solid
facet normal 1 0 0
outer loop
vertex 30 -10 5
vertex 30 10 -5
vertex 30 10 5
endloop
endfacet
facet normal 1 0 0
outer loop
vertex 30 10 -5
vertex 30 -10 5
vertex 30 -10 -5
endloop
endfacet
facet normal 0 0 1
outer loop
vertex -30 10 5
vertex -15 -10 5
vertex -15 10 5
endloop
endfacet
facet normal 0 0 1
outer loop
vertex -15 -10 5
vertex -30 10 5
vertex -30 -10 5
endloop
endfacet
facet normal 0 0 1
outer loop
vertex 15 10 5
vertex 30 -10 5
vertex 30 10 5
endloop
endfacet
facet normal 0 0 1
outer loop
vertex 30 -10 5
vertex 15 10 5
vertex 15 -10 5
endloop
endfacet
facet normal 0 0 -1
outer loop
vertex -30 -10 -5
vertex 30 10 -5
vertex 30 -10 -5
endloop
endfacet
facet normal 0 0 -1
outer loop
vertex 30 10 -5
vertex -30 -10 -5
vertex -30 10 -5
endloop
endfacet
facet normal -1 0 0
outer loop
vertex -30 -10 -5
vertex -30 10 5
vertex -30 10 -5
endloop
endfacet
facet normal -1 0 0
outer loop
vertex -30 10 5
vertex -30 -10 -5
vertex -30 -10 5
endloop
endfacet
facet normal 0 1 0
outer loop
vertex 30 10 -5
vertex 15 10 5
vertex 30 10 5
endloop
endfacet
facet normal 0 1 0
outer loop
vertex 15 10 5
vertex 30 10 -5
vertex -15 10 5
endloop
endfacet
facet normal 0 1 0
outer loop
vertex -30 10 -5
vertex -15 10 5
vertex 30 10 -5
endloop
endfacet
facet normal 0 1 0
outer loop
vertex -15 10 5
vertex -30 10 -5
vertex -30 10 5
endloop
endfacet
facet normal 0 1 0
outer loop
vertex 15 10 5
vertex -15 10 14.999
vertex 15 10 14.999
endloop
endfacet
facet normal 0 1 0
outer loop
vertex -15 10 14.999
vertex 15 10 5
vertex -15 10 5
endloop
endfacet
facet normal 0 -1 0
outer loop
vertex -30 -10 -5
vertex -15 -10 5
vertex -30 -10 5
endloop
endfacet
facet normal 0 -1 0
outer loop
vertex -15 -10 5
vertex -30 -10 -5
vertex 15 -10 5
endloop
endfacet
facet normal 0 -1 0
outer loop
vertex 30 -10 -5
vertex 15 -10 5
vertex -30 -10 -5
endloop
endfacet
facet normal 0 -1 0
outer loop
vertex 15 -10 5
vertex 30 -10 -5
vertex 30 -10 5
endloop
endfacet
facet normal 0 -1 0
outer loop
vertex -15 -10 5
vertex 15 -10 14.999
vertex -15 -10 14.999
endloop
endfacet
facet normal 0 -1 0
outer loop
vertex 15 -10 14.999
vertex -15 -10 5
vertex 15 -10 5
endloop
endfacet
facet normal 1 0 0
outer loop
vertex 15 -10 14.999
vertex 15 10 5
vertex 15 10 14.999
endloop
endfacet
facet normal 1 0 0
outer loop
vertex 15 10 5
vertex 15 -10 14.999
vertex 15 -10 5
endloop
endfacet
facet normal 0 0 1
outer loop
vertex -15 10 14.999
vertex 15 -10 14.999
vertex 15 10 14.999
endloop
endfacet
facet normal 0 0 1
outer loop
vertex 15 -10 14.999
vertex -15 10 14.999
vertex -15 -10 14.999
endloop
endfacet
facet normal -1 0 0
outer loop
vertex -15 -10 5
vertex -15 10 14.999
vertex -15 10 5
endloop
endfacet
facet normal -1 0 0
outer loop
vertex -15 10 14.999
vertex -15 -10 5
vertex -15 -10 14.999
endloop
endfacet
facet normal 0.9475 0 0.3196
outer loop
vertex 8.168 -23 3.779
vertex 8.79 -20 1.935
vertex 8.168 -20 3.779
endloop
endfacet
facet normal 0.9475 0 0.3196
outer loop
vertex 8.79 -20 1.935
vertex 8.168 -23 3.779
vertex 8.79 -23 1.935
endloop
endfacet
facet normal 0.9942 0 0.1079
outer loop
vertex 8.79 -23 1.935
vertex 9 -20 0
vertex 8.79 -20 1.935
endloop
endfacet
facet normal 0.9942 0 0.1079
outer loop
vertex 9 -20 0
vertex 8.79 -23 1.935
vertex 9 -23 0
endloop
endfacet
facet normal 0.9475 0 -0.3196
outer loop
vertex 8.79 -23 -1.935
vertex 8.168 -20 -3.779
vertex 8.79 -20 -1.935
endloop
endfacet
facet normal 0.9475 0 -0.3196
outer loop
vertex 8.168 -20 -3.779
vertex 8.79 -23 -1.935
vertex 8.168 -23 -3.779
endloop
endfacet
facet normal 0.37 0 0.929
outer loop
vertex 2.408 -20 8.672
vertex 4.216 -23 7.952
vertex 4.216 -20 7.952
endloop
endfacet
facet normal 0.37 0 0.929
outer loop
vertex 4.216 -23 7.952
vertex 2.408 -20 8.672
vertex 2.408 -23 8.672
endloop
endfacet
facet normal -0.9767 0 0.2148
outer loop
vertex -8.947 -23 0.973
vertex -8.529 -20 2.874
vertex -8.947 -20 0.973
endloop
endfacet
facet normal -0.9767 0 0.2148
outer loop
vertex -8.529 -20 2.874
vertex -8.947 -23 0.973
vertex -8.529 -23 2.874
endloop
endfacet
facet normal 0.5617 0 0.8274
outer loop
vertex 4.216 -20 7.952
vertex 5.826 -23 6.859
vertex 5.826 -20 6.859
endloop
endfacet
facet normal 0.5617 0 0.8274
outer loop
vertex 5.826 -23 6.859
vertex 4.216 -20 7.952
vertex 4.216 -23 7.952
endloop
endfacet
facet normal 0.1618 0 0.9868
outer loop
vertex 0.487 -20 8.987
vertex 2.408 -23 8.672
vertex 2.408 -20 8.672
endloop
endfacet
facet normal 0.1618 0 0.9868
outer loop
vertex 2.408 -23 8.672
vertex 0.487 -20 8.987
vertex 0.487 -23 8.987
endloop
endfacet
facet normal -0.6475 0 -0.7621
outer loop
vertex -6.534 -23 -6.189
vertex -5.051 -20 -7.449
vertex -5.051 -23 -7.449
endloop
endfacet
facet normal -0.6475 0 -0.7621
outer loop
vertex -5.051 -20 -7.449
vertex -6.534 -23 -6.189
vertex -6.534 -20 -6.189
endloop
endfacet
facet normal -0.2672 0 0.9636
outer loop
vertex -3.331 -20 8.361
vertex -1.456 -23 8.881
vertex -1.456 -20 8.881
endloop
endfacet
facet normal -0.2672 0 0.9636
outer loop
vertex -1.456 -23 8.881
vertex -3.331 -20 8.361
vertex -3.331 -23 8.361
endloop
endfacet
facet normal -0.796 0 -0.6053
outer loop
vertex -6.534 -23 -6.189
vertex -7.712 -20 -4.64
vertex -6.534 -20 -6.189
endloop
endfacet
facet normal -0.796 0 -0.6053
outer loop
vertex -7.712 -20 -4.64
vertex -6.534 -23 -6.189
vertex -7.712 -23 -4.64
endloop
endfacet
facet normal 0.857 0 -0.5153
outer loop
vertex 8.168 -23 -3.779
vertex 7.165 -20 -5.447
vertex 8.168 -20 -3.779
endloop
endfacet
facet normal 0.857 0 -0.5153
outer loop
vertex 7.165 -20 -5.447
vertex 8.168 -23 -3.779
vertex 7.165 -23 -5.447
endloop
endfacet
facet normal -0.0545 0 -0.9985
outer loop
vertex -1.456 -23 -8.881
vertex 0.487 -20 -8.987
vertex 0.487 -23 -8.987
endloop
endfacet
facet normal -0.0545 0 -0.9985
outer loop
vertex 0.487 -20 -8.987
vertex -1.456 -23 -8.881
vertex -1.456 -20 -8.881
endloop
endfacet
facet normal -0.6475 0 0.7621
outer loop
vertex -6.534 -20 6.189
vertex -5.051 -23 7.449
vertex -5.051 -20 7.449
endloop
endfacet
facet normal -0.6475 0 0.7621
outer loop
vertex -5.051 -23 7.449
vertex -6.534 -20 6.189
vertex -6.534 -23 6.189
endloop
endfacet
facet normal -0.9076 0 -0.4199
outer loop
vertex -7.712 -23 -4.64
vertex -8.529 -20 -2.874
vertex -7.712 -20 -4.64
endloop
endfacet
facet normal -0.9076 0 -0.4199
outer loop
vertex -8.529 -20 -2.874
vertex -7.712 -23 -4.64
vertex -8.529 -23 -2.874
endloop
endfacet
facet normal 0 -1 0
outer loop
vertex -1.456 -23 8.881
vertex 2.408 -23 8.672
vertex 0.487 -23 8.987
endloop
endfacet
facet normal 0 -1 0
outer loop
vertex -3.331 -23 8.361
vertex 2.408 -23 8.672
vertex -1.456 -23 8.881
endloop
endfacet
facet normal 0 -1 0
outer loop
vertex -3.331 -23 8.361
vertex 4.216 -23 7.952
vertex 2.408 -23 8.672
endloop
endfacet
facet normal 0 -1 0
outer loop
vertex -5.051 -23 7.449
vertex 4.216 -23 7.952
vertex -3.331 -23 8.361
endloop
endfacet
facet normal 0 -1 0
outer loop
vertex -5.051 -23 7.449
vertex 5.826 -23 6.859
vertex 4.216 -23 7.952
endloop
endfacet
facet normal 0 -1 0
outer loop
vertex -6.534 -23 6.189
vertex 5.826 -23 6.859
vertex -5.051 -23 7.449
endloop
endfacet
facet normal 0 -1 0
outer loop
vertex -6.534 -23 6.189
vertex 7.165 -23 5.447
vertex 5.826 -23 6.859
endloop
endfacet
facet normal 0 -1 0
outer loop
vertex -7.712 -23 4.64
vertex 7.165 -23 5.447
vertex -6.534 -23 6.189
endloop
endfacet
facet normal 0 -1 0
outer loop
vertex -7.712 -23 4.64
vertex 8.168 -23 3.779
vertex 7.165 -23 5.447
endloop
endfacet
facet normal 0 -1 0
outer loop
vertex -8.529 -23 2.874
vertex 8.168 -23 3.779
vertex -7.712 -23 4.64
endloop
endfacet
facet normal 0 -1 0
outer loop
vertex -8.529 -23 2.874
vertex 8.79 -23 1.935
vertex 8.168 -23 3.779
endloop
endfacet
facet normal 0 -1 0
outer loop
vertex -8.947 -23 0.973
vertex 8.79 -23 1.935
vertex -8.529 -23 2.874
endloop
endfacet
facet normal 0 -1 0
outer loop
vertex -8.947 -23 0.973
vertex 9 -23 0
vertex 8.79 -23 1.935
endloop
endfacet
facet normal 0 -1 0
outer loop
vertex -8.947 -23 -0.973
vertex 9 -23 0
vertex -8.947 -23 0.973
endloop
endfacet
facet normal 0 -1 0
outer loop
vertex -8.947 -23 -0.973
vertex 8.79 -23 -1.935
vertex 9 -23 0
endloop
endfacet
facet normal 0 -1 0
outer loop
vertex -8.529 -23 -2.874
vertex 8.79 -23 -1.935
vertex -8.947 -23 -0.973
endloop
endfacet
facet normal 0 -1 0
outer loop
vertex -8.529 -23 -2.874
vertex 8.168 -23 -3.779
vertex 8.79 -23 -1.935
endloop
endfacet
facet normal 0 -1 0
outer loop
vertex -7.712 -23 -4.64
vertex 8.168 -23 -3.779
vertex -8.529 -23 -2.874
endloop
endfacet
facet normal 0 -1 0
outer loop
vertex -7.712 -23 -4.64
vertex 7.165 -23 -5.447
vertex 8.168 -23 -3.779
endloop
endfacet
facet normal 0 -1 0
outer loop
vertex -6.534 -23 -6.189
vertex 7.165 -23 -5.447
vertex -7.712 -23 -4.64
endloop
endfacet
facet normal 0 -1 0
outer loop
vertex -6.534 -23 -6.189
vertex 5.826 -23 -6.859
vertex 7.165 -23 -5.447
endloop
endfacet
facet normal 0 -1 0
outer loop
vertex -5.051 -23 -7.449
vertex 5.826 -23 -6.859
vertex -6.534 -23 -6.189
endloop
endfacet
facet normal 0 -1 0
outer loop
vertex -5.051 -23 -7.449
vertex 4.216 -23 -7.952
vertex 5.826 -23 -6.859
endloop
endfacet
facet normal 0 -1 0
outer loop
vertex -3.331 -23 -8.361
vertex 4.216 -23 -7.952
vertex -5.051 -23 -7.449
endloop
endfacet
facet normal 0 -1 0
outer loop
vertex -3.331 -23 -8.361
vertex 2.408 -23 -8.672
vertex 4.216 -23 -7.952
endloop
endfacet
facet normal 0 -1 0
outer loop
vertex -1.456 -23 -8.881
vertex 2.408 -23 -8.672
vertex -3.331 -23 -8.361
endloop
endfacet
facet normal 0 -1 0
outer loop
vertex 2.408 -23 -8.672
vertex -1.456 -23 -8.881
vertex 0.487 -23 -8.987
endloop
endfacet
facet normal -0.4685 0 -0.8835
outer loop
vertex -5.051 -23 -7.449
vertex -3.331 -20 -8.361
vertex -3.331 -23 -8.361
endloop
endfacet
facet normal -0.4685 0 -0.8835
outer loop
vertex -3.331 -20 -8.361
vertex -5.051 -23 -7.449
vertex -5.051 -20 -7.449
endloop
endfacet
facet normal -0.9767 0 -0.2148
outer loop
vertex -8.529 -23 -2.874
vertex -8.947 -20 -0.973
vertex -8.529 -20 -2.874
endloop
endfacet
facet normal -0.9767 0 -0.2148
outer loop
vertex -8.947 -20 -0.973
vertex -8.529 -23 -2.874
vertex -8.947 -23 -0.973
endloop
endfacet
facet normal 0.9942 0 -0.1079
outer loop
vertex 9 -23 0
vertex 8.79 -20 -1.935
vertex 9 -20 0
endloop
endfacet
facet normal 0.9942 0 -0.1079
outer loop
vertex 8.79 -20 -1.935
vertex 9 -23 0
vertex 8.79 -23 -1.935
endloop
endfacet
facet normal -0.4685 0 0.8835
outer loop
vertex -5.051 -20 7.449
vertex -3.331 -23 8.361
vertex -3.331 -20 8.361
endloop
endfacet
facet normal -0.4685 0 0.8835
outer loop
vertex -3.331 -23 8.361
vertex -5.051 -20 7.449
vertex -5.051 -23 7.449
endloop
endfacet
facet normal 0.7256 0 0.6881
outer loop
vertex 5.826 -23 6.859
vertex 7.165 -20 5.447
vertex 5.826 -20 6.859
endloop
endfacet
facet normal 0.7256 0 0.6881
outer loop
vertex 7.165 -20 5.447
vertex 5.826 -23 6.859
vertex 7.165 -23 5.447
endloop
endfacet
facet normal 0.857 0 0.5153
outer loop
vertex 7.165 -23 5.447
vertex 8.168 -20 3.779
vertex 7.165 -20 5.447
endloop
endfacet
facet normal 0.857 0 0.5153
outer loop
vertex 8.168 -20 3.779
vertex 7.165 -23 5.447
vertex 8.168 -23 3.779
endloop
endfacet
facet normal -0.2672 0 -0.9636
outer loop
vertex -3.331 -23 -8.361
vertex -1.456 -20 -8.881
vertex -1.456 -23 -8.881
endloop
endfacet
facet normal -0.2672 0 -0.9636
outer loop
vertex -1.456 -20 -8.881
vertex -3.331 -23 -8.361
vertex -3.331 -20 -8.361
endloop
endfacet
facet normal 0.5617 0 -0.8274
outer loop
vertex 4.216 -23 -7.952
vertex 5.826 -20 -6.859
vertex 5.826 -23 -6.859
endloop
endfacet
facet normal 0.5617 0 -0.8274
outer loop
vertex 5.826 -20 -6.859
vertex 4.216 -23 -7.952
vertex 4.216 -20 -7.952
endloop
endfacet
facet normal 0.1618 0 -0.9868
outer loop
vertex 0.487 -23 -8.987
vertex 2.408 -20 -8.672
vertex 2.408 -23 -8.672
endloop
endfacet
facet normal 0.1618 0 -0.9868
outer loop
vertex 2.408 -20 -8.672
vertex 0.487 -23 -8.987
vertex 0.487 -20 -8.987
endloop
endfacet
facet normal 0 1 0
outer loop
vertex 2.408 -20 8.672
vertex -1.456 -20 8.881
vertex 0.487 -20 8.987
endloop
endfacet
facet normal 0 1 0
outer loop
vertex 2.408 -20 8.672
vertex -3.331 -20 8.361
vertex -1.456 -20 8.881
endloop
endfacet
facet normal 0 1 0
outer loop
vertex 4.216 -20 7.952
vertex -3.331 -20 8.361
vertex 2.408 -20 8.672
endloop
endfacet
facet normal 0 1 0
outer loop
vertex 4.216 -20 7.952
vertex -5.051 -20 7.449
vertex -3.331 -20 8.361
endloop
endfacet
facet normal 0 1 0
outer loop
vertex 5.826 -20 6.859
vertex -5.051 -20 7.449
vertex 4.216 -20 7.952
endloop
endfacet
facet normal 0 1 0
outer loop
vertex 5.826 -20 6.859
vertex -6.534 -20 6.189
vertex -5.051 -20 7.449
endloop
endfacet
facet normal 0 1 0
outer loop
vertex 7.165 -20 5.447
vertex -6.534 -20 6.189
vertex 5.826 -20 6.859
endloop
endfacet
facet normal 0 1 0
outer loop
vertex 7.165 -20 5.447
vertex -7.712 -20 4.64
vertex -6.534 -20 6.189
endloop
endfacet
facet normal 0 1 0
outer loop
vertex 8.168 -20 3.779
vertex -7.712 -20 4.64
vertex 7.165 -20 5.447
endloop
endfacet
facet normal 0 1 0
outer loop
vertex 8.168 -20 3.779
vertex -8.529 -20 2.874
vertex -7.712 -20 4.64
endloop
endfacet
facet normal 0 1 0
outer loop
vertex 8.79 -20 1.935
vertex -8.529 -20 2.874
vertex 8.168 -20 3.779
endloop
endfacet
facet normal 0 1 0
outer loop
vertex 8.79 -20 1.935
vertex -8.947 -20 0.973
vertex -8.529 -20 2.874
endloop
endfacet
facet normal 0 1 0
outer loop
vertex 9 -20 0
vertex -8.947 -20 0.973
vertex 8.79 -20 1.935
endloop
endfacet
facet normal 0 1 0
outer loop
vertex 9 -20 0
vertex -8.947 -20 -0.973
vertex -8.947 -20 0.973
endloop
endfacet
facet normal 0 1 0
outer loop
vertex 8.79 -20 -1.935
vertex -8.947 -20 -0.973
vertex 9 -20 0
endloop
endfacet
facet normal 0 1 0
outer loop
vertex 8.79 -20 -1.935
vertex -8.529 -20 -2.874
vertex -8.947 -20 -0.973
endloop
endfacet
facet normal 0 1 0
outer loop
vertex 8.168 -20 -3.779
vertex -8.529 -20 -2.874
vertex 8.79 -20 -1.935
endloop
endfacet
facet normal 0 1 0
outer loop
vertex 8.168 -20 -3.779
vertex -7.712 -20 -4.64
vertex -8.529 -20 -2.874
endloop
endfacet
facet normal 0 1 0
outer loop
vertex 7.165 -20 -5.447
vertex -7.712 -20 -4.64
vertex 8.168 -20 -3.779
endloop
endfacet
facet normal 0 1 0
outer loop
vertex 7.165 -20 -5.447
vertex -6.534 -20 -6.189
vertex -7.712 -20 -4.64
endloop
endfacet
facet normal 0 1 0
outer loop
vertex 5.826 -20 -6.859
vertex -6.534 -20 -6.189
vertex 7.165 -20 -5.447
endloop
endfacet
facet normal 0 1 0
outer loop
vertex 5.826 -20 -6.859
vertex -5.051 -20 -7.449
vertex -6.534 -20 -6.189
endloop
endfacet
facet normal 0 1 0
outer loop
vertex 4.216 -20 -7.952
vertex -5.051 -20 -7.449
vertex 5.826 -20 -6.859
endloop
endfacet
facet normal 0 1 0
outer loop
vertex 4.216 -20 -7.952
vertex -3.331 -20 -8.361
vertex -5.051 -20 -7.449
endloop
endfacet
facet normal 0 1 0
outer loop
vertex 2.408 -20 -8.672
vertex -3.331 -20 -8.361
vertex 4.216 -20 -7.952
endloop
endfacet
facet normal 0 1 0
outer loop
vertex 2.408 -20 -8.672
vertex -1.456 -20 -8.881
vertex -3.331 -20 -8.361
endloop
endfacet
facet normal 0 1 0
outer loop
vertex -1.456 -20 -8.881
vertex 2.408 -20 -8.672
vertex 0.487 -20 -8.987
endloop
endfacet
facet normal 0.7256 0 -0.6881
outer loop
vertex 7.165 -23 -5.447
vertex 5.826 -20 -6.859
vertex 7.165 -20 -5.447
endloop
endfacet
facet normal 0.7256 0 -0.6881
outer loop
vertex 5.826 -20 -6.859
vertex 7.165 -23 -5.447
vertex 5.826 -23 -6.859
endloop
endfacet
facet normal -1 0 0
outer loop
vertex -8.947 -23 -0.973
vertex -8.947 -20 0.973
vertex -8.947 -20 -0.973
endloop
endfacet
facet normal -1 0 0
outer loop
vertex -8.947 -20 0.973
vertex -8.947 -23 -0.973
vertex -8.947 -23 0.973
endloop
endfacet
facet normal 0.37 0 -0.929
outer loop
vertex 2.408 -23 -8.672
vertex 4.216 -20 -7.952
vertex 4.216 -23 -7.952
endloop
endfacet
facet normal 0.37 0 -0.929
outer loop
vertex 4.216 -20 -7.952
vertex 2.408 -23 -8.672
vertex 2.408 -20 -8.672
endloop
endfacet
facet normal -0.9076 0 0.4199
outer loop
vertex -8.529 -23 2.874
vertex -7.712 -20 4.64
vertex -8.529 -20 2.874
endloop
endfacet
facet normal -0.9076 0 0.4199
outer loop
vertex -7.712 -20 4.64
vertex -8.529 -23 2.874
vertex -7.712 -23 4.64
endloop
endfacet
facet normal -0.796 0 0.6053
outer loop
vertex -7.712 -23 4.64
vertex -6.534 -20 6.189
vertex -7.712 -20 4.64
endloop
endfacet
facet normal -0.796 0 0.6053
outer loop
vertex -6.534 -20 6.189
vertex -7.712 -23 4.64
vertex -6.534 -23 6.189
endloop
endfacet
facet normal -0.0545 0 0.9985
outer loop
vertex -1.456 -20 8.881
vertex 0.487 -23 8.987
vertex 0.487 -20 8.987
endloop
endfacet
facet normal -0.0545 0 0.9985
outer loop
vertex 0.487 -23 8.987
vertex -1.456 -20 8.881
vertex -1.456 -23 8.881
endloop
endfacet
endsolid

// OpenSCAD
cube([60,20,10],center=true);
translate([0,0,10-0.001])
    cube([30,20,10],center=true);
// tutorial suggests rotating before translating because rotation happens in reference to origin
// the transformations are applied backwards
translate([0,-20,0])
rotate([90,0,0])
    cylinder(h=3, r=9);
